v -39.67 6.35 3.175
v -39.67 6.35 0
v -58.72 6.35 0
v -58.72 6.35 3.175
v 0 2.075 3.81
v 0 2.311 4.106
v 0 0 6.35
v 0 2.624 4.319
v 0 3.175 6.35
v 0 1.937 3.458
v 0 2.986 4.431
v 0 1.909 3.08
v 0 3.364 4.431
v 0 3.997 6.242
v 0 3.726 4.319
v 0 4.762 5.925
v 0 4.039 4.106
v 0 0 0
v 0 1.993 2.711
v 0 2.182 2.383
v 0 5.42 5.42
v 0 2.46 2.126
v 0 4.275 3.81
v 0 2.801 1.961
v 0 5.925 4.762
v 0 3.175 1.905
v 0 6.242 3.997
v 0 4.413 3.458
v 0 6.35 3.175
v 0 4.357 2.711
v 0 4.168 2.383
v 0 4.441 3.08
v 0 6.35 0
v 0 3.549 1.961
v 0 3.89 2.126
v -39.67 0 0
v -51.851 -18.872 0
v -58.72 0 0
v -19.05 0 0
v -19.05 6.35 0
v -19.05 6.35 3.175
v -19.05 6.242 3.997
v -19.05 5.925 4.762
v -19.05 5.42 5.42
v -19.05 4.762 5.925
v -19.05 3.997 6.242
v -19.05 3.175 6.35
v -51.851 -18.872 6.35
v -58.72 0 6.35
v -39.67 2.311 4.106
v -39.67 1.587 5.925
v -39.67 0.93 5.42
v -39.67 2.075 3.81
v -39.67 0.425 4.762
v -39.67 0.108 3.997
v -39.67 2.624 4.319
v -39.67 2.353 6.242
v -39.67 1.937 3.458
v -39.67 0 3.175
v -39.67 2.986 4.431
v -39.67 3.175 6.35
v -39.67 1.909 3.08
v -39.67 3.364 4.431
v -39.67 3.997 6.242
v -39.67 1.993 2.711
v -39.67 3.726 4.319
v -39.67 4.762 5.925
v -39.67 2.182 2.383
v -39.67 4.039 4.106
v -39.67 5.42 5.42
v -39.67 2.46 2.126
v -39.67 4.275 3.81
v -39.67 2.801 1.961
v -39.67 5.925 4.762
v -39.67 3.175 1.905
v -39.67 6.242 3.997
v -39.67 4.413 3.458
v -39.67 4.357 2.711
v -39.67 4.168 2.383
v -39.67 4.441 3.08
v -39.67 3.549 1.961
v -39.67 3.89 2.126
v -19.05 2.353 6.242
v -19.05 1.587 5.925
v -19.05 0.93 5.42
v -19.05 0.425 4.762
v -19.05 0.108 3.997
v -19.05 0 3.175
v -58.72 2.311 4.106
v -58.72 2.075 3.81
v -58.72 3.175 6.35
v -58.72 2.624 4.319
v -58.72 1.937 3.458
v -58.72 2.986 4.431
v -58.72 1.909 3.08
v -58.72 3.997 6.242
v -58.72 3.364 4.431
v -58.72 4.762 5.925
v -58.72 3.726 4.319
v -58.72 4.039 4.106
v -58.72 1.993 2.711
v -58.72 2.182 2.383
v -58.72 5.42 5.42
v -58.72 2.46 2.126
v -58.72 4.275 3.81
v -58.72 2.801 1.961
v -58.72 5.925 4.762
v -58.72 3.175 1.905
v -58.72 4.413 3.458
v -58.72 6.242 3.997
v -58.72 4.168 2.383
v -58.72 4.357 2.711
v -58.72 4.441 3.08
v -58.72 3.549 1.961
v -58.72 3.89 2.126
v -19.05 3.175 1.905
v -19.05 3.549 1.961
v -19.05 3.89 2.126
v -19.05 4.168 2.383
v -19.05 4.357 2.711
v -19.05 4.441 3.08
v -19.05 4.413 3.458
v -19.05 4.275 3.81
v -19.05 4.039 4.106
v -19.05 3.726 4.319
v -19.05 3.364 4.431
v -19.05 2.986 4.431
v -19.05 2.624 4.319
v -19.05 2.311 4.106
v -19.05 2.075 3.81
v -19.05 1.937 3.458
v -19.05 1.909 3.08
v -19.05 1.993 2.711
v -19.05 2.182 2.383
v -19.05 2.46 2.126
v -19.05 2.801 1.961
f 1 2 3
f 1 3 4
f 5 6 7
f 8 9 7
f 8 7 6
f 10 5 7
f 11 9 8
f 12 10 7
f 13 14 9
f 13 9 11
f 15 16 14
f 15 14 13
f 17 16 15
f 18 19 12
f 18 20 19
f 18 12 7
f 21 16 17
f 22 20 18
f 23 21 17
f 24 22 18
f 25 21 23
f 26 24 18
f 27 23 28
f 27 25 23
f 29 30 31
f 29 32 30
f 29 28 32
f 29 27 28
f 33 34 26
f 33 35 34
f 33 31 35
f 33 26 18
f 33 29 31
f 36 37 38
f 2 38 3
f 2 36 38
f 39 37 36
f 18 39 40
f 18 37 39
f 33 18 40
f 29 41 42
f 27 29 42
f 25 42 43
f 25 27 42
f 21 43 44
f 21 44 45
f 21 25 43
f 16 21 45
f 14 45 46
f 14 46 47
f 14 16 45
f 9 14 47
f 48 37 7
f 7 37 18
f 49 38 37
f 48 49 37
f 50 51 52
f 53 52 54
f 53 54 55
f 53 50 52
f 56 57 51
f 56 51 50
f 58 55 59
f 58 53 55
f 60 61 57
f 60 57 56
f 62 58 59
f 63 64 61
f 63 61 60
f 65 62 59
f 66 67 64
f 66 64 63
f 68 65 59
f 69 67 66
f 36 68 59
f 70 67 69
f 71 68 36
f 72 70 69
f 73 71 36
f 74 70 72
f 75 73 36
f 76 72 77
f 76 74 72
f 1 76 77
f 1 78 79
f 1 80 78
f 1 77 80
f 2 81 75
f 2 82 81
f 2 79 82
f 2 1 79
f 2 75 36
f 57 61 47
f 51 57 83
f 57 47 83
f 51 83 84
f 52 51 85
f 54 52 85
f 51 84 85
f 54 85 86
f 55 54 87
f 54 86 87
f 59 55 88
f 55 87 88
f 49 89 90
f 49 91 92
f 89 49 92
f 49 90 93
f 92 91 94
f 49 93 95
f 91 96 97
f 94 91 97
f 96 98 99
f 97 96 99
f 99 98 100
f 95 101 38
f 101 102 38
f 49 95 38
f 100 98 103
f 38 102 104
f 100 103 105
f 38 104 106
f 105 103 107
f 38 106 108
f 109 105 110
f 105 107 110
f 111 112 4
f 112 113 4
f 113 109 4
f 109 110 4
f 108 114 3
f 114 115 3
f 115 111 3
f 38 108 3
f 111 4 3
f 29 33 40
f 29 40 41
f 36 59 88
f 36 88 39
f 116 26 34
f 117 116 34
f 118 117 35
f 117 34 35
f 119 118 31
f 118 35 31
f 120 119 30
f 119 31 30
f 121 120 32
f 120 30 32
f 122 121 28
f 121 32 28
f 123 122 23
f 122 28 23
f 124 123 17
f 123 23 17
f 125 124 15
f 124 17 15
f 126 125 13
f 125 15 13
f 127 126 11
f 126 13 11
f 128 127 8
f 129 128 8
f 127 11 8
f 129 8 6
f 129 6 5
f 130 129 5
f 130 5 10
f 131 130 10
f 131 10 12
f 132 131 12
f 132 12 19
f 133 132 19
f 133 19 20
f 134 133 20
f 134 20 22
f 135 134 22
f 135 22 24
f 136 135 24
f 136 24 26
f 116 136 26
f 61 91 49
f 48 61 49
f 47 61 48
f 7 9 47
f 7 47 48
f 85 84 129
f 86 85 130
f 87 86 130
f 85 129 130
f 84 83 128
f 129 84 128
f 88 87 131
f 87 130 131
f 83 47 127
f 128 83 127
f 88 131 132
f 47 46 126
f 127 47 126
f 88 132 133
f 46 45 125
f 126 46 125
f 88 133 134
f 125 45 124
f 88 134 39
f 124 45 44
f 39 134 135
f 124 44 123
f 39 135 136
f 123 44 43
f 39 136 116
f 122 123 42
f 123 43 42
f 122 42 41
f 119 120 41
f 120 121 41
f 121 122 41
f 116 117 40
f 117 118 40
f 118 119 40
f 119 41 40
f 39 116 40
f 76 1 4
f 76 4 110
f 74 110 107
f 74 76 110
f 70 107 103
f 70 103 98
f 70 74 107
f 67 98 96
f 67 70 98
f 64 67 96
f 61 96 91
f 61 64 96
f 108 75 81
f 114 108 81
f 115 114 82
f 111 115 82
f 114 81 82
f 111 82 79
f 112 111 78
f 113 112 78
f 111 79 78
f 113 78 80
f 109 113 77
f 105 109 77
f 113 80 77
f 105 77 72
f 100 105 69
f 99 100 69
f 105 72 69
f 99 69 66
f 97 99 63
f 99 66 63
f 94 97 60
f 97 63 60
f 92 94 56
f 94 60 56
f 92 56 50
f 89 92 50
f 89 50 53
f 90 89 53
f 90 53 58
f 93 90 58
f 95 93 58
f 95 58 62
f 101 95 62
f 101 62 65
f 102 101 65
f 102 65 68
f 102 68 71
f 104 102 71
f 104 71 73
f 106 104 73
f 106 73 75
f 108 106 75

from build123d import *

# Parameters (mm, degrees)
BOSS_EXTRUDE1_DEPTH = 6.35
SKETCH3_R           = 3.175
SKETCH3_R_2         = 1.27
BOSS_EXTRUDE3_DEPTH = 58.720417
CUT_EXTRUDE3_START  = -19.05
SKETCH3_7_R         = 3.175
SKETCH3_7_R_2       = 1.27
CUT_EXTRUDE3_DEPTH  = 20.620416805


with BuildPart() as part:
    # Sketch1 → Boss-Extrude1 (new body)
    with BuildSketch(Plane.XY):
        Polygon((-51.851432898, -18.872378179), (0, 0), (-58.720416805, 0), align=None)
    extrude(amount=BOSS_EXTRUDE1_DEPTH)

    # Sketch3 → Boss-Extrude3 (add)
    with BuildSketch(Plane(origin=(0, 0, 0), x_dir=(0, 0, -1), z_dir=(1, 0, 0))):
        with Locations((-3.175, 3.175)):
            Circle(SKETCH3_R)
        with Locations((-3.175, 3.175)):
            Circle(SKETCH3_R_2, mode=Mode.SUBTRACT)
        with BuildLine():
            Line((0, 0), (0, 3.175))
            ThreePointArc((0, 3.175), (-0.92993597, 0.92993597), (-3.175, 0))
            Line((-3.175, 0), (0, 0))
        make_face()
        with BuildLine():
            Line((0, 6.35), (-3.175, 6.35))
            ThreePointArc((-3.175, 6.35), (-0.92993597, 5.42006403), (0, 3.175))
            Line((0, 3.175), (0, 6.35))
        make_face()
        with BuildLine():
            ThreePointArc((-3.175, 0), (-5.42006403, 0.92993597), (-6.35, 3.175))
            Line((-6.35, 3.175), (-6.35, 0))
            Line((-6.35, 0), (-3.175, 0))
        make_face()
    extrude(amount=-BOSS_EXTRUDE3_DEPTH)

    # Sketch3<7> → Cut-Extrude3 (cut)
    with BuildSketch(Plane(origin=(0, 0, 0), x_dir=(0, 0, -1), z_dir=(1, 0, 0)).offset(CUT_EXTRUDE3_START)):
        with Locations((-3.175, 3.175)):
            Circle(SKETCH3_7_R)
        with Locations((-3.175, 3.175)):
            Circle(SKETCH3_7_R_2, mode=Mode.SUBTRACT)
        with BuildLine():
            Line((0, 6.35), (-3.175, 6.35))
            ThreePointArc((-3.175, 6.35), (-0.92993597, 5.42006403), (0, 3.175))
            Line((0, 3.175), (0, 6.35))
        make_face()
        with BuildLine():
            Line((0, 0), (0, 3.175))
            ThreePointArc((0, 3.175), (-0.92993597, 0.92993597), (-3.175, 0))
            Line((-3.175, 0), (0, 0))
        make_face()
    extrude(amount=-CUT_EXTRUDE3_DEPTH, mode=Mode.SUBTRACT)


solid = part.part
